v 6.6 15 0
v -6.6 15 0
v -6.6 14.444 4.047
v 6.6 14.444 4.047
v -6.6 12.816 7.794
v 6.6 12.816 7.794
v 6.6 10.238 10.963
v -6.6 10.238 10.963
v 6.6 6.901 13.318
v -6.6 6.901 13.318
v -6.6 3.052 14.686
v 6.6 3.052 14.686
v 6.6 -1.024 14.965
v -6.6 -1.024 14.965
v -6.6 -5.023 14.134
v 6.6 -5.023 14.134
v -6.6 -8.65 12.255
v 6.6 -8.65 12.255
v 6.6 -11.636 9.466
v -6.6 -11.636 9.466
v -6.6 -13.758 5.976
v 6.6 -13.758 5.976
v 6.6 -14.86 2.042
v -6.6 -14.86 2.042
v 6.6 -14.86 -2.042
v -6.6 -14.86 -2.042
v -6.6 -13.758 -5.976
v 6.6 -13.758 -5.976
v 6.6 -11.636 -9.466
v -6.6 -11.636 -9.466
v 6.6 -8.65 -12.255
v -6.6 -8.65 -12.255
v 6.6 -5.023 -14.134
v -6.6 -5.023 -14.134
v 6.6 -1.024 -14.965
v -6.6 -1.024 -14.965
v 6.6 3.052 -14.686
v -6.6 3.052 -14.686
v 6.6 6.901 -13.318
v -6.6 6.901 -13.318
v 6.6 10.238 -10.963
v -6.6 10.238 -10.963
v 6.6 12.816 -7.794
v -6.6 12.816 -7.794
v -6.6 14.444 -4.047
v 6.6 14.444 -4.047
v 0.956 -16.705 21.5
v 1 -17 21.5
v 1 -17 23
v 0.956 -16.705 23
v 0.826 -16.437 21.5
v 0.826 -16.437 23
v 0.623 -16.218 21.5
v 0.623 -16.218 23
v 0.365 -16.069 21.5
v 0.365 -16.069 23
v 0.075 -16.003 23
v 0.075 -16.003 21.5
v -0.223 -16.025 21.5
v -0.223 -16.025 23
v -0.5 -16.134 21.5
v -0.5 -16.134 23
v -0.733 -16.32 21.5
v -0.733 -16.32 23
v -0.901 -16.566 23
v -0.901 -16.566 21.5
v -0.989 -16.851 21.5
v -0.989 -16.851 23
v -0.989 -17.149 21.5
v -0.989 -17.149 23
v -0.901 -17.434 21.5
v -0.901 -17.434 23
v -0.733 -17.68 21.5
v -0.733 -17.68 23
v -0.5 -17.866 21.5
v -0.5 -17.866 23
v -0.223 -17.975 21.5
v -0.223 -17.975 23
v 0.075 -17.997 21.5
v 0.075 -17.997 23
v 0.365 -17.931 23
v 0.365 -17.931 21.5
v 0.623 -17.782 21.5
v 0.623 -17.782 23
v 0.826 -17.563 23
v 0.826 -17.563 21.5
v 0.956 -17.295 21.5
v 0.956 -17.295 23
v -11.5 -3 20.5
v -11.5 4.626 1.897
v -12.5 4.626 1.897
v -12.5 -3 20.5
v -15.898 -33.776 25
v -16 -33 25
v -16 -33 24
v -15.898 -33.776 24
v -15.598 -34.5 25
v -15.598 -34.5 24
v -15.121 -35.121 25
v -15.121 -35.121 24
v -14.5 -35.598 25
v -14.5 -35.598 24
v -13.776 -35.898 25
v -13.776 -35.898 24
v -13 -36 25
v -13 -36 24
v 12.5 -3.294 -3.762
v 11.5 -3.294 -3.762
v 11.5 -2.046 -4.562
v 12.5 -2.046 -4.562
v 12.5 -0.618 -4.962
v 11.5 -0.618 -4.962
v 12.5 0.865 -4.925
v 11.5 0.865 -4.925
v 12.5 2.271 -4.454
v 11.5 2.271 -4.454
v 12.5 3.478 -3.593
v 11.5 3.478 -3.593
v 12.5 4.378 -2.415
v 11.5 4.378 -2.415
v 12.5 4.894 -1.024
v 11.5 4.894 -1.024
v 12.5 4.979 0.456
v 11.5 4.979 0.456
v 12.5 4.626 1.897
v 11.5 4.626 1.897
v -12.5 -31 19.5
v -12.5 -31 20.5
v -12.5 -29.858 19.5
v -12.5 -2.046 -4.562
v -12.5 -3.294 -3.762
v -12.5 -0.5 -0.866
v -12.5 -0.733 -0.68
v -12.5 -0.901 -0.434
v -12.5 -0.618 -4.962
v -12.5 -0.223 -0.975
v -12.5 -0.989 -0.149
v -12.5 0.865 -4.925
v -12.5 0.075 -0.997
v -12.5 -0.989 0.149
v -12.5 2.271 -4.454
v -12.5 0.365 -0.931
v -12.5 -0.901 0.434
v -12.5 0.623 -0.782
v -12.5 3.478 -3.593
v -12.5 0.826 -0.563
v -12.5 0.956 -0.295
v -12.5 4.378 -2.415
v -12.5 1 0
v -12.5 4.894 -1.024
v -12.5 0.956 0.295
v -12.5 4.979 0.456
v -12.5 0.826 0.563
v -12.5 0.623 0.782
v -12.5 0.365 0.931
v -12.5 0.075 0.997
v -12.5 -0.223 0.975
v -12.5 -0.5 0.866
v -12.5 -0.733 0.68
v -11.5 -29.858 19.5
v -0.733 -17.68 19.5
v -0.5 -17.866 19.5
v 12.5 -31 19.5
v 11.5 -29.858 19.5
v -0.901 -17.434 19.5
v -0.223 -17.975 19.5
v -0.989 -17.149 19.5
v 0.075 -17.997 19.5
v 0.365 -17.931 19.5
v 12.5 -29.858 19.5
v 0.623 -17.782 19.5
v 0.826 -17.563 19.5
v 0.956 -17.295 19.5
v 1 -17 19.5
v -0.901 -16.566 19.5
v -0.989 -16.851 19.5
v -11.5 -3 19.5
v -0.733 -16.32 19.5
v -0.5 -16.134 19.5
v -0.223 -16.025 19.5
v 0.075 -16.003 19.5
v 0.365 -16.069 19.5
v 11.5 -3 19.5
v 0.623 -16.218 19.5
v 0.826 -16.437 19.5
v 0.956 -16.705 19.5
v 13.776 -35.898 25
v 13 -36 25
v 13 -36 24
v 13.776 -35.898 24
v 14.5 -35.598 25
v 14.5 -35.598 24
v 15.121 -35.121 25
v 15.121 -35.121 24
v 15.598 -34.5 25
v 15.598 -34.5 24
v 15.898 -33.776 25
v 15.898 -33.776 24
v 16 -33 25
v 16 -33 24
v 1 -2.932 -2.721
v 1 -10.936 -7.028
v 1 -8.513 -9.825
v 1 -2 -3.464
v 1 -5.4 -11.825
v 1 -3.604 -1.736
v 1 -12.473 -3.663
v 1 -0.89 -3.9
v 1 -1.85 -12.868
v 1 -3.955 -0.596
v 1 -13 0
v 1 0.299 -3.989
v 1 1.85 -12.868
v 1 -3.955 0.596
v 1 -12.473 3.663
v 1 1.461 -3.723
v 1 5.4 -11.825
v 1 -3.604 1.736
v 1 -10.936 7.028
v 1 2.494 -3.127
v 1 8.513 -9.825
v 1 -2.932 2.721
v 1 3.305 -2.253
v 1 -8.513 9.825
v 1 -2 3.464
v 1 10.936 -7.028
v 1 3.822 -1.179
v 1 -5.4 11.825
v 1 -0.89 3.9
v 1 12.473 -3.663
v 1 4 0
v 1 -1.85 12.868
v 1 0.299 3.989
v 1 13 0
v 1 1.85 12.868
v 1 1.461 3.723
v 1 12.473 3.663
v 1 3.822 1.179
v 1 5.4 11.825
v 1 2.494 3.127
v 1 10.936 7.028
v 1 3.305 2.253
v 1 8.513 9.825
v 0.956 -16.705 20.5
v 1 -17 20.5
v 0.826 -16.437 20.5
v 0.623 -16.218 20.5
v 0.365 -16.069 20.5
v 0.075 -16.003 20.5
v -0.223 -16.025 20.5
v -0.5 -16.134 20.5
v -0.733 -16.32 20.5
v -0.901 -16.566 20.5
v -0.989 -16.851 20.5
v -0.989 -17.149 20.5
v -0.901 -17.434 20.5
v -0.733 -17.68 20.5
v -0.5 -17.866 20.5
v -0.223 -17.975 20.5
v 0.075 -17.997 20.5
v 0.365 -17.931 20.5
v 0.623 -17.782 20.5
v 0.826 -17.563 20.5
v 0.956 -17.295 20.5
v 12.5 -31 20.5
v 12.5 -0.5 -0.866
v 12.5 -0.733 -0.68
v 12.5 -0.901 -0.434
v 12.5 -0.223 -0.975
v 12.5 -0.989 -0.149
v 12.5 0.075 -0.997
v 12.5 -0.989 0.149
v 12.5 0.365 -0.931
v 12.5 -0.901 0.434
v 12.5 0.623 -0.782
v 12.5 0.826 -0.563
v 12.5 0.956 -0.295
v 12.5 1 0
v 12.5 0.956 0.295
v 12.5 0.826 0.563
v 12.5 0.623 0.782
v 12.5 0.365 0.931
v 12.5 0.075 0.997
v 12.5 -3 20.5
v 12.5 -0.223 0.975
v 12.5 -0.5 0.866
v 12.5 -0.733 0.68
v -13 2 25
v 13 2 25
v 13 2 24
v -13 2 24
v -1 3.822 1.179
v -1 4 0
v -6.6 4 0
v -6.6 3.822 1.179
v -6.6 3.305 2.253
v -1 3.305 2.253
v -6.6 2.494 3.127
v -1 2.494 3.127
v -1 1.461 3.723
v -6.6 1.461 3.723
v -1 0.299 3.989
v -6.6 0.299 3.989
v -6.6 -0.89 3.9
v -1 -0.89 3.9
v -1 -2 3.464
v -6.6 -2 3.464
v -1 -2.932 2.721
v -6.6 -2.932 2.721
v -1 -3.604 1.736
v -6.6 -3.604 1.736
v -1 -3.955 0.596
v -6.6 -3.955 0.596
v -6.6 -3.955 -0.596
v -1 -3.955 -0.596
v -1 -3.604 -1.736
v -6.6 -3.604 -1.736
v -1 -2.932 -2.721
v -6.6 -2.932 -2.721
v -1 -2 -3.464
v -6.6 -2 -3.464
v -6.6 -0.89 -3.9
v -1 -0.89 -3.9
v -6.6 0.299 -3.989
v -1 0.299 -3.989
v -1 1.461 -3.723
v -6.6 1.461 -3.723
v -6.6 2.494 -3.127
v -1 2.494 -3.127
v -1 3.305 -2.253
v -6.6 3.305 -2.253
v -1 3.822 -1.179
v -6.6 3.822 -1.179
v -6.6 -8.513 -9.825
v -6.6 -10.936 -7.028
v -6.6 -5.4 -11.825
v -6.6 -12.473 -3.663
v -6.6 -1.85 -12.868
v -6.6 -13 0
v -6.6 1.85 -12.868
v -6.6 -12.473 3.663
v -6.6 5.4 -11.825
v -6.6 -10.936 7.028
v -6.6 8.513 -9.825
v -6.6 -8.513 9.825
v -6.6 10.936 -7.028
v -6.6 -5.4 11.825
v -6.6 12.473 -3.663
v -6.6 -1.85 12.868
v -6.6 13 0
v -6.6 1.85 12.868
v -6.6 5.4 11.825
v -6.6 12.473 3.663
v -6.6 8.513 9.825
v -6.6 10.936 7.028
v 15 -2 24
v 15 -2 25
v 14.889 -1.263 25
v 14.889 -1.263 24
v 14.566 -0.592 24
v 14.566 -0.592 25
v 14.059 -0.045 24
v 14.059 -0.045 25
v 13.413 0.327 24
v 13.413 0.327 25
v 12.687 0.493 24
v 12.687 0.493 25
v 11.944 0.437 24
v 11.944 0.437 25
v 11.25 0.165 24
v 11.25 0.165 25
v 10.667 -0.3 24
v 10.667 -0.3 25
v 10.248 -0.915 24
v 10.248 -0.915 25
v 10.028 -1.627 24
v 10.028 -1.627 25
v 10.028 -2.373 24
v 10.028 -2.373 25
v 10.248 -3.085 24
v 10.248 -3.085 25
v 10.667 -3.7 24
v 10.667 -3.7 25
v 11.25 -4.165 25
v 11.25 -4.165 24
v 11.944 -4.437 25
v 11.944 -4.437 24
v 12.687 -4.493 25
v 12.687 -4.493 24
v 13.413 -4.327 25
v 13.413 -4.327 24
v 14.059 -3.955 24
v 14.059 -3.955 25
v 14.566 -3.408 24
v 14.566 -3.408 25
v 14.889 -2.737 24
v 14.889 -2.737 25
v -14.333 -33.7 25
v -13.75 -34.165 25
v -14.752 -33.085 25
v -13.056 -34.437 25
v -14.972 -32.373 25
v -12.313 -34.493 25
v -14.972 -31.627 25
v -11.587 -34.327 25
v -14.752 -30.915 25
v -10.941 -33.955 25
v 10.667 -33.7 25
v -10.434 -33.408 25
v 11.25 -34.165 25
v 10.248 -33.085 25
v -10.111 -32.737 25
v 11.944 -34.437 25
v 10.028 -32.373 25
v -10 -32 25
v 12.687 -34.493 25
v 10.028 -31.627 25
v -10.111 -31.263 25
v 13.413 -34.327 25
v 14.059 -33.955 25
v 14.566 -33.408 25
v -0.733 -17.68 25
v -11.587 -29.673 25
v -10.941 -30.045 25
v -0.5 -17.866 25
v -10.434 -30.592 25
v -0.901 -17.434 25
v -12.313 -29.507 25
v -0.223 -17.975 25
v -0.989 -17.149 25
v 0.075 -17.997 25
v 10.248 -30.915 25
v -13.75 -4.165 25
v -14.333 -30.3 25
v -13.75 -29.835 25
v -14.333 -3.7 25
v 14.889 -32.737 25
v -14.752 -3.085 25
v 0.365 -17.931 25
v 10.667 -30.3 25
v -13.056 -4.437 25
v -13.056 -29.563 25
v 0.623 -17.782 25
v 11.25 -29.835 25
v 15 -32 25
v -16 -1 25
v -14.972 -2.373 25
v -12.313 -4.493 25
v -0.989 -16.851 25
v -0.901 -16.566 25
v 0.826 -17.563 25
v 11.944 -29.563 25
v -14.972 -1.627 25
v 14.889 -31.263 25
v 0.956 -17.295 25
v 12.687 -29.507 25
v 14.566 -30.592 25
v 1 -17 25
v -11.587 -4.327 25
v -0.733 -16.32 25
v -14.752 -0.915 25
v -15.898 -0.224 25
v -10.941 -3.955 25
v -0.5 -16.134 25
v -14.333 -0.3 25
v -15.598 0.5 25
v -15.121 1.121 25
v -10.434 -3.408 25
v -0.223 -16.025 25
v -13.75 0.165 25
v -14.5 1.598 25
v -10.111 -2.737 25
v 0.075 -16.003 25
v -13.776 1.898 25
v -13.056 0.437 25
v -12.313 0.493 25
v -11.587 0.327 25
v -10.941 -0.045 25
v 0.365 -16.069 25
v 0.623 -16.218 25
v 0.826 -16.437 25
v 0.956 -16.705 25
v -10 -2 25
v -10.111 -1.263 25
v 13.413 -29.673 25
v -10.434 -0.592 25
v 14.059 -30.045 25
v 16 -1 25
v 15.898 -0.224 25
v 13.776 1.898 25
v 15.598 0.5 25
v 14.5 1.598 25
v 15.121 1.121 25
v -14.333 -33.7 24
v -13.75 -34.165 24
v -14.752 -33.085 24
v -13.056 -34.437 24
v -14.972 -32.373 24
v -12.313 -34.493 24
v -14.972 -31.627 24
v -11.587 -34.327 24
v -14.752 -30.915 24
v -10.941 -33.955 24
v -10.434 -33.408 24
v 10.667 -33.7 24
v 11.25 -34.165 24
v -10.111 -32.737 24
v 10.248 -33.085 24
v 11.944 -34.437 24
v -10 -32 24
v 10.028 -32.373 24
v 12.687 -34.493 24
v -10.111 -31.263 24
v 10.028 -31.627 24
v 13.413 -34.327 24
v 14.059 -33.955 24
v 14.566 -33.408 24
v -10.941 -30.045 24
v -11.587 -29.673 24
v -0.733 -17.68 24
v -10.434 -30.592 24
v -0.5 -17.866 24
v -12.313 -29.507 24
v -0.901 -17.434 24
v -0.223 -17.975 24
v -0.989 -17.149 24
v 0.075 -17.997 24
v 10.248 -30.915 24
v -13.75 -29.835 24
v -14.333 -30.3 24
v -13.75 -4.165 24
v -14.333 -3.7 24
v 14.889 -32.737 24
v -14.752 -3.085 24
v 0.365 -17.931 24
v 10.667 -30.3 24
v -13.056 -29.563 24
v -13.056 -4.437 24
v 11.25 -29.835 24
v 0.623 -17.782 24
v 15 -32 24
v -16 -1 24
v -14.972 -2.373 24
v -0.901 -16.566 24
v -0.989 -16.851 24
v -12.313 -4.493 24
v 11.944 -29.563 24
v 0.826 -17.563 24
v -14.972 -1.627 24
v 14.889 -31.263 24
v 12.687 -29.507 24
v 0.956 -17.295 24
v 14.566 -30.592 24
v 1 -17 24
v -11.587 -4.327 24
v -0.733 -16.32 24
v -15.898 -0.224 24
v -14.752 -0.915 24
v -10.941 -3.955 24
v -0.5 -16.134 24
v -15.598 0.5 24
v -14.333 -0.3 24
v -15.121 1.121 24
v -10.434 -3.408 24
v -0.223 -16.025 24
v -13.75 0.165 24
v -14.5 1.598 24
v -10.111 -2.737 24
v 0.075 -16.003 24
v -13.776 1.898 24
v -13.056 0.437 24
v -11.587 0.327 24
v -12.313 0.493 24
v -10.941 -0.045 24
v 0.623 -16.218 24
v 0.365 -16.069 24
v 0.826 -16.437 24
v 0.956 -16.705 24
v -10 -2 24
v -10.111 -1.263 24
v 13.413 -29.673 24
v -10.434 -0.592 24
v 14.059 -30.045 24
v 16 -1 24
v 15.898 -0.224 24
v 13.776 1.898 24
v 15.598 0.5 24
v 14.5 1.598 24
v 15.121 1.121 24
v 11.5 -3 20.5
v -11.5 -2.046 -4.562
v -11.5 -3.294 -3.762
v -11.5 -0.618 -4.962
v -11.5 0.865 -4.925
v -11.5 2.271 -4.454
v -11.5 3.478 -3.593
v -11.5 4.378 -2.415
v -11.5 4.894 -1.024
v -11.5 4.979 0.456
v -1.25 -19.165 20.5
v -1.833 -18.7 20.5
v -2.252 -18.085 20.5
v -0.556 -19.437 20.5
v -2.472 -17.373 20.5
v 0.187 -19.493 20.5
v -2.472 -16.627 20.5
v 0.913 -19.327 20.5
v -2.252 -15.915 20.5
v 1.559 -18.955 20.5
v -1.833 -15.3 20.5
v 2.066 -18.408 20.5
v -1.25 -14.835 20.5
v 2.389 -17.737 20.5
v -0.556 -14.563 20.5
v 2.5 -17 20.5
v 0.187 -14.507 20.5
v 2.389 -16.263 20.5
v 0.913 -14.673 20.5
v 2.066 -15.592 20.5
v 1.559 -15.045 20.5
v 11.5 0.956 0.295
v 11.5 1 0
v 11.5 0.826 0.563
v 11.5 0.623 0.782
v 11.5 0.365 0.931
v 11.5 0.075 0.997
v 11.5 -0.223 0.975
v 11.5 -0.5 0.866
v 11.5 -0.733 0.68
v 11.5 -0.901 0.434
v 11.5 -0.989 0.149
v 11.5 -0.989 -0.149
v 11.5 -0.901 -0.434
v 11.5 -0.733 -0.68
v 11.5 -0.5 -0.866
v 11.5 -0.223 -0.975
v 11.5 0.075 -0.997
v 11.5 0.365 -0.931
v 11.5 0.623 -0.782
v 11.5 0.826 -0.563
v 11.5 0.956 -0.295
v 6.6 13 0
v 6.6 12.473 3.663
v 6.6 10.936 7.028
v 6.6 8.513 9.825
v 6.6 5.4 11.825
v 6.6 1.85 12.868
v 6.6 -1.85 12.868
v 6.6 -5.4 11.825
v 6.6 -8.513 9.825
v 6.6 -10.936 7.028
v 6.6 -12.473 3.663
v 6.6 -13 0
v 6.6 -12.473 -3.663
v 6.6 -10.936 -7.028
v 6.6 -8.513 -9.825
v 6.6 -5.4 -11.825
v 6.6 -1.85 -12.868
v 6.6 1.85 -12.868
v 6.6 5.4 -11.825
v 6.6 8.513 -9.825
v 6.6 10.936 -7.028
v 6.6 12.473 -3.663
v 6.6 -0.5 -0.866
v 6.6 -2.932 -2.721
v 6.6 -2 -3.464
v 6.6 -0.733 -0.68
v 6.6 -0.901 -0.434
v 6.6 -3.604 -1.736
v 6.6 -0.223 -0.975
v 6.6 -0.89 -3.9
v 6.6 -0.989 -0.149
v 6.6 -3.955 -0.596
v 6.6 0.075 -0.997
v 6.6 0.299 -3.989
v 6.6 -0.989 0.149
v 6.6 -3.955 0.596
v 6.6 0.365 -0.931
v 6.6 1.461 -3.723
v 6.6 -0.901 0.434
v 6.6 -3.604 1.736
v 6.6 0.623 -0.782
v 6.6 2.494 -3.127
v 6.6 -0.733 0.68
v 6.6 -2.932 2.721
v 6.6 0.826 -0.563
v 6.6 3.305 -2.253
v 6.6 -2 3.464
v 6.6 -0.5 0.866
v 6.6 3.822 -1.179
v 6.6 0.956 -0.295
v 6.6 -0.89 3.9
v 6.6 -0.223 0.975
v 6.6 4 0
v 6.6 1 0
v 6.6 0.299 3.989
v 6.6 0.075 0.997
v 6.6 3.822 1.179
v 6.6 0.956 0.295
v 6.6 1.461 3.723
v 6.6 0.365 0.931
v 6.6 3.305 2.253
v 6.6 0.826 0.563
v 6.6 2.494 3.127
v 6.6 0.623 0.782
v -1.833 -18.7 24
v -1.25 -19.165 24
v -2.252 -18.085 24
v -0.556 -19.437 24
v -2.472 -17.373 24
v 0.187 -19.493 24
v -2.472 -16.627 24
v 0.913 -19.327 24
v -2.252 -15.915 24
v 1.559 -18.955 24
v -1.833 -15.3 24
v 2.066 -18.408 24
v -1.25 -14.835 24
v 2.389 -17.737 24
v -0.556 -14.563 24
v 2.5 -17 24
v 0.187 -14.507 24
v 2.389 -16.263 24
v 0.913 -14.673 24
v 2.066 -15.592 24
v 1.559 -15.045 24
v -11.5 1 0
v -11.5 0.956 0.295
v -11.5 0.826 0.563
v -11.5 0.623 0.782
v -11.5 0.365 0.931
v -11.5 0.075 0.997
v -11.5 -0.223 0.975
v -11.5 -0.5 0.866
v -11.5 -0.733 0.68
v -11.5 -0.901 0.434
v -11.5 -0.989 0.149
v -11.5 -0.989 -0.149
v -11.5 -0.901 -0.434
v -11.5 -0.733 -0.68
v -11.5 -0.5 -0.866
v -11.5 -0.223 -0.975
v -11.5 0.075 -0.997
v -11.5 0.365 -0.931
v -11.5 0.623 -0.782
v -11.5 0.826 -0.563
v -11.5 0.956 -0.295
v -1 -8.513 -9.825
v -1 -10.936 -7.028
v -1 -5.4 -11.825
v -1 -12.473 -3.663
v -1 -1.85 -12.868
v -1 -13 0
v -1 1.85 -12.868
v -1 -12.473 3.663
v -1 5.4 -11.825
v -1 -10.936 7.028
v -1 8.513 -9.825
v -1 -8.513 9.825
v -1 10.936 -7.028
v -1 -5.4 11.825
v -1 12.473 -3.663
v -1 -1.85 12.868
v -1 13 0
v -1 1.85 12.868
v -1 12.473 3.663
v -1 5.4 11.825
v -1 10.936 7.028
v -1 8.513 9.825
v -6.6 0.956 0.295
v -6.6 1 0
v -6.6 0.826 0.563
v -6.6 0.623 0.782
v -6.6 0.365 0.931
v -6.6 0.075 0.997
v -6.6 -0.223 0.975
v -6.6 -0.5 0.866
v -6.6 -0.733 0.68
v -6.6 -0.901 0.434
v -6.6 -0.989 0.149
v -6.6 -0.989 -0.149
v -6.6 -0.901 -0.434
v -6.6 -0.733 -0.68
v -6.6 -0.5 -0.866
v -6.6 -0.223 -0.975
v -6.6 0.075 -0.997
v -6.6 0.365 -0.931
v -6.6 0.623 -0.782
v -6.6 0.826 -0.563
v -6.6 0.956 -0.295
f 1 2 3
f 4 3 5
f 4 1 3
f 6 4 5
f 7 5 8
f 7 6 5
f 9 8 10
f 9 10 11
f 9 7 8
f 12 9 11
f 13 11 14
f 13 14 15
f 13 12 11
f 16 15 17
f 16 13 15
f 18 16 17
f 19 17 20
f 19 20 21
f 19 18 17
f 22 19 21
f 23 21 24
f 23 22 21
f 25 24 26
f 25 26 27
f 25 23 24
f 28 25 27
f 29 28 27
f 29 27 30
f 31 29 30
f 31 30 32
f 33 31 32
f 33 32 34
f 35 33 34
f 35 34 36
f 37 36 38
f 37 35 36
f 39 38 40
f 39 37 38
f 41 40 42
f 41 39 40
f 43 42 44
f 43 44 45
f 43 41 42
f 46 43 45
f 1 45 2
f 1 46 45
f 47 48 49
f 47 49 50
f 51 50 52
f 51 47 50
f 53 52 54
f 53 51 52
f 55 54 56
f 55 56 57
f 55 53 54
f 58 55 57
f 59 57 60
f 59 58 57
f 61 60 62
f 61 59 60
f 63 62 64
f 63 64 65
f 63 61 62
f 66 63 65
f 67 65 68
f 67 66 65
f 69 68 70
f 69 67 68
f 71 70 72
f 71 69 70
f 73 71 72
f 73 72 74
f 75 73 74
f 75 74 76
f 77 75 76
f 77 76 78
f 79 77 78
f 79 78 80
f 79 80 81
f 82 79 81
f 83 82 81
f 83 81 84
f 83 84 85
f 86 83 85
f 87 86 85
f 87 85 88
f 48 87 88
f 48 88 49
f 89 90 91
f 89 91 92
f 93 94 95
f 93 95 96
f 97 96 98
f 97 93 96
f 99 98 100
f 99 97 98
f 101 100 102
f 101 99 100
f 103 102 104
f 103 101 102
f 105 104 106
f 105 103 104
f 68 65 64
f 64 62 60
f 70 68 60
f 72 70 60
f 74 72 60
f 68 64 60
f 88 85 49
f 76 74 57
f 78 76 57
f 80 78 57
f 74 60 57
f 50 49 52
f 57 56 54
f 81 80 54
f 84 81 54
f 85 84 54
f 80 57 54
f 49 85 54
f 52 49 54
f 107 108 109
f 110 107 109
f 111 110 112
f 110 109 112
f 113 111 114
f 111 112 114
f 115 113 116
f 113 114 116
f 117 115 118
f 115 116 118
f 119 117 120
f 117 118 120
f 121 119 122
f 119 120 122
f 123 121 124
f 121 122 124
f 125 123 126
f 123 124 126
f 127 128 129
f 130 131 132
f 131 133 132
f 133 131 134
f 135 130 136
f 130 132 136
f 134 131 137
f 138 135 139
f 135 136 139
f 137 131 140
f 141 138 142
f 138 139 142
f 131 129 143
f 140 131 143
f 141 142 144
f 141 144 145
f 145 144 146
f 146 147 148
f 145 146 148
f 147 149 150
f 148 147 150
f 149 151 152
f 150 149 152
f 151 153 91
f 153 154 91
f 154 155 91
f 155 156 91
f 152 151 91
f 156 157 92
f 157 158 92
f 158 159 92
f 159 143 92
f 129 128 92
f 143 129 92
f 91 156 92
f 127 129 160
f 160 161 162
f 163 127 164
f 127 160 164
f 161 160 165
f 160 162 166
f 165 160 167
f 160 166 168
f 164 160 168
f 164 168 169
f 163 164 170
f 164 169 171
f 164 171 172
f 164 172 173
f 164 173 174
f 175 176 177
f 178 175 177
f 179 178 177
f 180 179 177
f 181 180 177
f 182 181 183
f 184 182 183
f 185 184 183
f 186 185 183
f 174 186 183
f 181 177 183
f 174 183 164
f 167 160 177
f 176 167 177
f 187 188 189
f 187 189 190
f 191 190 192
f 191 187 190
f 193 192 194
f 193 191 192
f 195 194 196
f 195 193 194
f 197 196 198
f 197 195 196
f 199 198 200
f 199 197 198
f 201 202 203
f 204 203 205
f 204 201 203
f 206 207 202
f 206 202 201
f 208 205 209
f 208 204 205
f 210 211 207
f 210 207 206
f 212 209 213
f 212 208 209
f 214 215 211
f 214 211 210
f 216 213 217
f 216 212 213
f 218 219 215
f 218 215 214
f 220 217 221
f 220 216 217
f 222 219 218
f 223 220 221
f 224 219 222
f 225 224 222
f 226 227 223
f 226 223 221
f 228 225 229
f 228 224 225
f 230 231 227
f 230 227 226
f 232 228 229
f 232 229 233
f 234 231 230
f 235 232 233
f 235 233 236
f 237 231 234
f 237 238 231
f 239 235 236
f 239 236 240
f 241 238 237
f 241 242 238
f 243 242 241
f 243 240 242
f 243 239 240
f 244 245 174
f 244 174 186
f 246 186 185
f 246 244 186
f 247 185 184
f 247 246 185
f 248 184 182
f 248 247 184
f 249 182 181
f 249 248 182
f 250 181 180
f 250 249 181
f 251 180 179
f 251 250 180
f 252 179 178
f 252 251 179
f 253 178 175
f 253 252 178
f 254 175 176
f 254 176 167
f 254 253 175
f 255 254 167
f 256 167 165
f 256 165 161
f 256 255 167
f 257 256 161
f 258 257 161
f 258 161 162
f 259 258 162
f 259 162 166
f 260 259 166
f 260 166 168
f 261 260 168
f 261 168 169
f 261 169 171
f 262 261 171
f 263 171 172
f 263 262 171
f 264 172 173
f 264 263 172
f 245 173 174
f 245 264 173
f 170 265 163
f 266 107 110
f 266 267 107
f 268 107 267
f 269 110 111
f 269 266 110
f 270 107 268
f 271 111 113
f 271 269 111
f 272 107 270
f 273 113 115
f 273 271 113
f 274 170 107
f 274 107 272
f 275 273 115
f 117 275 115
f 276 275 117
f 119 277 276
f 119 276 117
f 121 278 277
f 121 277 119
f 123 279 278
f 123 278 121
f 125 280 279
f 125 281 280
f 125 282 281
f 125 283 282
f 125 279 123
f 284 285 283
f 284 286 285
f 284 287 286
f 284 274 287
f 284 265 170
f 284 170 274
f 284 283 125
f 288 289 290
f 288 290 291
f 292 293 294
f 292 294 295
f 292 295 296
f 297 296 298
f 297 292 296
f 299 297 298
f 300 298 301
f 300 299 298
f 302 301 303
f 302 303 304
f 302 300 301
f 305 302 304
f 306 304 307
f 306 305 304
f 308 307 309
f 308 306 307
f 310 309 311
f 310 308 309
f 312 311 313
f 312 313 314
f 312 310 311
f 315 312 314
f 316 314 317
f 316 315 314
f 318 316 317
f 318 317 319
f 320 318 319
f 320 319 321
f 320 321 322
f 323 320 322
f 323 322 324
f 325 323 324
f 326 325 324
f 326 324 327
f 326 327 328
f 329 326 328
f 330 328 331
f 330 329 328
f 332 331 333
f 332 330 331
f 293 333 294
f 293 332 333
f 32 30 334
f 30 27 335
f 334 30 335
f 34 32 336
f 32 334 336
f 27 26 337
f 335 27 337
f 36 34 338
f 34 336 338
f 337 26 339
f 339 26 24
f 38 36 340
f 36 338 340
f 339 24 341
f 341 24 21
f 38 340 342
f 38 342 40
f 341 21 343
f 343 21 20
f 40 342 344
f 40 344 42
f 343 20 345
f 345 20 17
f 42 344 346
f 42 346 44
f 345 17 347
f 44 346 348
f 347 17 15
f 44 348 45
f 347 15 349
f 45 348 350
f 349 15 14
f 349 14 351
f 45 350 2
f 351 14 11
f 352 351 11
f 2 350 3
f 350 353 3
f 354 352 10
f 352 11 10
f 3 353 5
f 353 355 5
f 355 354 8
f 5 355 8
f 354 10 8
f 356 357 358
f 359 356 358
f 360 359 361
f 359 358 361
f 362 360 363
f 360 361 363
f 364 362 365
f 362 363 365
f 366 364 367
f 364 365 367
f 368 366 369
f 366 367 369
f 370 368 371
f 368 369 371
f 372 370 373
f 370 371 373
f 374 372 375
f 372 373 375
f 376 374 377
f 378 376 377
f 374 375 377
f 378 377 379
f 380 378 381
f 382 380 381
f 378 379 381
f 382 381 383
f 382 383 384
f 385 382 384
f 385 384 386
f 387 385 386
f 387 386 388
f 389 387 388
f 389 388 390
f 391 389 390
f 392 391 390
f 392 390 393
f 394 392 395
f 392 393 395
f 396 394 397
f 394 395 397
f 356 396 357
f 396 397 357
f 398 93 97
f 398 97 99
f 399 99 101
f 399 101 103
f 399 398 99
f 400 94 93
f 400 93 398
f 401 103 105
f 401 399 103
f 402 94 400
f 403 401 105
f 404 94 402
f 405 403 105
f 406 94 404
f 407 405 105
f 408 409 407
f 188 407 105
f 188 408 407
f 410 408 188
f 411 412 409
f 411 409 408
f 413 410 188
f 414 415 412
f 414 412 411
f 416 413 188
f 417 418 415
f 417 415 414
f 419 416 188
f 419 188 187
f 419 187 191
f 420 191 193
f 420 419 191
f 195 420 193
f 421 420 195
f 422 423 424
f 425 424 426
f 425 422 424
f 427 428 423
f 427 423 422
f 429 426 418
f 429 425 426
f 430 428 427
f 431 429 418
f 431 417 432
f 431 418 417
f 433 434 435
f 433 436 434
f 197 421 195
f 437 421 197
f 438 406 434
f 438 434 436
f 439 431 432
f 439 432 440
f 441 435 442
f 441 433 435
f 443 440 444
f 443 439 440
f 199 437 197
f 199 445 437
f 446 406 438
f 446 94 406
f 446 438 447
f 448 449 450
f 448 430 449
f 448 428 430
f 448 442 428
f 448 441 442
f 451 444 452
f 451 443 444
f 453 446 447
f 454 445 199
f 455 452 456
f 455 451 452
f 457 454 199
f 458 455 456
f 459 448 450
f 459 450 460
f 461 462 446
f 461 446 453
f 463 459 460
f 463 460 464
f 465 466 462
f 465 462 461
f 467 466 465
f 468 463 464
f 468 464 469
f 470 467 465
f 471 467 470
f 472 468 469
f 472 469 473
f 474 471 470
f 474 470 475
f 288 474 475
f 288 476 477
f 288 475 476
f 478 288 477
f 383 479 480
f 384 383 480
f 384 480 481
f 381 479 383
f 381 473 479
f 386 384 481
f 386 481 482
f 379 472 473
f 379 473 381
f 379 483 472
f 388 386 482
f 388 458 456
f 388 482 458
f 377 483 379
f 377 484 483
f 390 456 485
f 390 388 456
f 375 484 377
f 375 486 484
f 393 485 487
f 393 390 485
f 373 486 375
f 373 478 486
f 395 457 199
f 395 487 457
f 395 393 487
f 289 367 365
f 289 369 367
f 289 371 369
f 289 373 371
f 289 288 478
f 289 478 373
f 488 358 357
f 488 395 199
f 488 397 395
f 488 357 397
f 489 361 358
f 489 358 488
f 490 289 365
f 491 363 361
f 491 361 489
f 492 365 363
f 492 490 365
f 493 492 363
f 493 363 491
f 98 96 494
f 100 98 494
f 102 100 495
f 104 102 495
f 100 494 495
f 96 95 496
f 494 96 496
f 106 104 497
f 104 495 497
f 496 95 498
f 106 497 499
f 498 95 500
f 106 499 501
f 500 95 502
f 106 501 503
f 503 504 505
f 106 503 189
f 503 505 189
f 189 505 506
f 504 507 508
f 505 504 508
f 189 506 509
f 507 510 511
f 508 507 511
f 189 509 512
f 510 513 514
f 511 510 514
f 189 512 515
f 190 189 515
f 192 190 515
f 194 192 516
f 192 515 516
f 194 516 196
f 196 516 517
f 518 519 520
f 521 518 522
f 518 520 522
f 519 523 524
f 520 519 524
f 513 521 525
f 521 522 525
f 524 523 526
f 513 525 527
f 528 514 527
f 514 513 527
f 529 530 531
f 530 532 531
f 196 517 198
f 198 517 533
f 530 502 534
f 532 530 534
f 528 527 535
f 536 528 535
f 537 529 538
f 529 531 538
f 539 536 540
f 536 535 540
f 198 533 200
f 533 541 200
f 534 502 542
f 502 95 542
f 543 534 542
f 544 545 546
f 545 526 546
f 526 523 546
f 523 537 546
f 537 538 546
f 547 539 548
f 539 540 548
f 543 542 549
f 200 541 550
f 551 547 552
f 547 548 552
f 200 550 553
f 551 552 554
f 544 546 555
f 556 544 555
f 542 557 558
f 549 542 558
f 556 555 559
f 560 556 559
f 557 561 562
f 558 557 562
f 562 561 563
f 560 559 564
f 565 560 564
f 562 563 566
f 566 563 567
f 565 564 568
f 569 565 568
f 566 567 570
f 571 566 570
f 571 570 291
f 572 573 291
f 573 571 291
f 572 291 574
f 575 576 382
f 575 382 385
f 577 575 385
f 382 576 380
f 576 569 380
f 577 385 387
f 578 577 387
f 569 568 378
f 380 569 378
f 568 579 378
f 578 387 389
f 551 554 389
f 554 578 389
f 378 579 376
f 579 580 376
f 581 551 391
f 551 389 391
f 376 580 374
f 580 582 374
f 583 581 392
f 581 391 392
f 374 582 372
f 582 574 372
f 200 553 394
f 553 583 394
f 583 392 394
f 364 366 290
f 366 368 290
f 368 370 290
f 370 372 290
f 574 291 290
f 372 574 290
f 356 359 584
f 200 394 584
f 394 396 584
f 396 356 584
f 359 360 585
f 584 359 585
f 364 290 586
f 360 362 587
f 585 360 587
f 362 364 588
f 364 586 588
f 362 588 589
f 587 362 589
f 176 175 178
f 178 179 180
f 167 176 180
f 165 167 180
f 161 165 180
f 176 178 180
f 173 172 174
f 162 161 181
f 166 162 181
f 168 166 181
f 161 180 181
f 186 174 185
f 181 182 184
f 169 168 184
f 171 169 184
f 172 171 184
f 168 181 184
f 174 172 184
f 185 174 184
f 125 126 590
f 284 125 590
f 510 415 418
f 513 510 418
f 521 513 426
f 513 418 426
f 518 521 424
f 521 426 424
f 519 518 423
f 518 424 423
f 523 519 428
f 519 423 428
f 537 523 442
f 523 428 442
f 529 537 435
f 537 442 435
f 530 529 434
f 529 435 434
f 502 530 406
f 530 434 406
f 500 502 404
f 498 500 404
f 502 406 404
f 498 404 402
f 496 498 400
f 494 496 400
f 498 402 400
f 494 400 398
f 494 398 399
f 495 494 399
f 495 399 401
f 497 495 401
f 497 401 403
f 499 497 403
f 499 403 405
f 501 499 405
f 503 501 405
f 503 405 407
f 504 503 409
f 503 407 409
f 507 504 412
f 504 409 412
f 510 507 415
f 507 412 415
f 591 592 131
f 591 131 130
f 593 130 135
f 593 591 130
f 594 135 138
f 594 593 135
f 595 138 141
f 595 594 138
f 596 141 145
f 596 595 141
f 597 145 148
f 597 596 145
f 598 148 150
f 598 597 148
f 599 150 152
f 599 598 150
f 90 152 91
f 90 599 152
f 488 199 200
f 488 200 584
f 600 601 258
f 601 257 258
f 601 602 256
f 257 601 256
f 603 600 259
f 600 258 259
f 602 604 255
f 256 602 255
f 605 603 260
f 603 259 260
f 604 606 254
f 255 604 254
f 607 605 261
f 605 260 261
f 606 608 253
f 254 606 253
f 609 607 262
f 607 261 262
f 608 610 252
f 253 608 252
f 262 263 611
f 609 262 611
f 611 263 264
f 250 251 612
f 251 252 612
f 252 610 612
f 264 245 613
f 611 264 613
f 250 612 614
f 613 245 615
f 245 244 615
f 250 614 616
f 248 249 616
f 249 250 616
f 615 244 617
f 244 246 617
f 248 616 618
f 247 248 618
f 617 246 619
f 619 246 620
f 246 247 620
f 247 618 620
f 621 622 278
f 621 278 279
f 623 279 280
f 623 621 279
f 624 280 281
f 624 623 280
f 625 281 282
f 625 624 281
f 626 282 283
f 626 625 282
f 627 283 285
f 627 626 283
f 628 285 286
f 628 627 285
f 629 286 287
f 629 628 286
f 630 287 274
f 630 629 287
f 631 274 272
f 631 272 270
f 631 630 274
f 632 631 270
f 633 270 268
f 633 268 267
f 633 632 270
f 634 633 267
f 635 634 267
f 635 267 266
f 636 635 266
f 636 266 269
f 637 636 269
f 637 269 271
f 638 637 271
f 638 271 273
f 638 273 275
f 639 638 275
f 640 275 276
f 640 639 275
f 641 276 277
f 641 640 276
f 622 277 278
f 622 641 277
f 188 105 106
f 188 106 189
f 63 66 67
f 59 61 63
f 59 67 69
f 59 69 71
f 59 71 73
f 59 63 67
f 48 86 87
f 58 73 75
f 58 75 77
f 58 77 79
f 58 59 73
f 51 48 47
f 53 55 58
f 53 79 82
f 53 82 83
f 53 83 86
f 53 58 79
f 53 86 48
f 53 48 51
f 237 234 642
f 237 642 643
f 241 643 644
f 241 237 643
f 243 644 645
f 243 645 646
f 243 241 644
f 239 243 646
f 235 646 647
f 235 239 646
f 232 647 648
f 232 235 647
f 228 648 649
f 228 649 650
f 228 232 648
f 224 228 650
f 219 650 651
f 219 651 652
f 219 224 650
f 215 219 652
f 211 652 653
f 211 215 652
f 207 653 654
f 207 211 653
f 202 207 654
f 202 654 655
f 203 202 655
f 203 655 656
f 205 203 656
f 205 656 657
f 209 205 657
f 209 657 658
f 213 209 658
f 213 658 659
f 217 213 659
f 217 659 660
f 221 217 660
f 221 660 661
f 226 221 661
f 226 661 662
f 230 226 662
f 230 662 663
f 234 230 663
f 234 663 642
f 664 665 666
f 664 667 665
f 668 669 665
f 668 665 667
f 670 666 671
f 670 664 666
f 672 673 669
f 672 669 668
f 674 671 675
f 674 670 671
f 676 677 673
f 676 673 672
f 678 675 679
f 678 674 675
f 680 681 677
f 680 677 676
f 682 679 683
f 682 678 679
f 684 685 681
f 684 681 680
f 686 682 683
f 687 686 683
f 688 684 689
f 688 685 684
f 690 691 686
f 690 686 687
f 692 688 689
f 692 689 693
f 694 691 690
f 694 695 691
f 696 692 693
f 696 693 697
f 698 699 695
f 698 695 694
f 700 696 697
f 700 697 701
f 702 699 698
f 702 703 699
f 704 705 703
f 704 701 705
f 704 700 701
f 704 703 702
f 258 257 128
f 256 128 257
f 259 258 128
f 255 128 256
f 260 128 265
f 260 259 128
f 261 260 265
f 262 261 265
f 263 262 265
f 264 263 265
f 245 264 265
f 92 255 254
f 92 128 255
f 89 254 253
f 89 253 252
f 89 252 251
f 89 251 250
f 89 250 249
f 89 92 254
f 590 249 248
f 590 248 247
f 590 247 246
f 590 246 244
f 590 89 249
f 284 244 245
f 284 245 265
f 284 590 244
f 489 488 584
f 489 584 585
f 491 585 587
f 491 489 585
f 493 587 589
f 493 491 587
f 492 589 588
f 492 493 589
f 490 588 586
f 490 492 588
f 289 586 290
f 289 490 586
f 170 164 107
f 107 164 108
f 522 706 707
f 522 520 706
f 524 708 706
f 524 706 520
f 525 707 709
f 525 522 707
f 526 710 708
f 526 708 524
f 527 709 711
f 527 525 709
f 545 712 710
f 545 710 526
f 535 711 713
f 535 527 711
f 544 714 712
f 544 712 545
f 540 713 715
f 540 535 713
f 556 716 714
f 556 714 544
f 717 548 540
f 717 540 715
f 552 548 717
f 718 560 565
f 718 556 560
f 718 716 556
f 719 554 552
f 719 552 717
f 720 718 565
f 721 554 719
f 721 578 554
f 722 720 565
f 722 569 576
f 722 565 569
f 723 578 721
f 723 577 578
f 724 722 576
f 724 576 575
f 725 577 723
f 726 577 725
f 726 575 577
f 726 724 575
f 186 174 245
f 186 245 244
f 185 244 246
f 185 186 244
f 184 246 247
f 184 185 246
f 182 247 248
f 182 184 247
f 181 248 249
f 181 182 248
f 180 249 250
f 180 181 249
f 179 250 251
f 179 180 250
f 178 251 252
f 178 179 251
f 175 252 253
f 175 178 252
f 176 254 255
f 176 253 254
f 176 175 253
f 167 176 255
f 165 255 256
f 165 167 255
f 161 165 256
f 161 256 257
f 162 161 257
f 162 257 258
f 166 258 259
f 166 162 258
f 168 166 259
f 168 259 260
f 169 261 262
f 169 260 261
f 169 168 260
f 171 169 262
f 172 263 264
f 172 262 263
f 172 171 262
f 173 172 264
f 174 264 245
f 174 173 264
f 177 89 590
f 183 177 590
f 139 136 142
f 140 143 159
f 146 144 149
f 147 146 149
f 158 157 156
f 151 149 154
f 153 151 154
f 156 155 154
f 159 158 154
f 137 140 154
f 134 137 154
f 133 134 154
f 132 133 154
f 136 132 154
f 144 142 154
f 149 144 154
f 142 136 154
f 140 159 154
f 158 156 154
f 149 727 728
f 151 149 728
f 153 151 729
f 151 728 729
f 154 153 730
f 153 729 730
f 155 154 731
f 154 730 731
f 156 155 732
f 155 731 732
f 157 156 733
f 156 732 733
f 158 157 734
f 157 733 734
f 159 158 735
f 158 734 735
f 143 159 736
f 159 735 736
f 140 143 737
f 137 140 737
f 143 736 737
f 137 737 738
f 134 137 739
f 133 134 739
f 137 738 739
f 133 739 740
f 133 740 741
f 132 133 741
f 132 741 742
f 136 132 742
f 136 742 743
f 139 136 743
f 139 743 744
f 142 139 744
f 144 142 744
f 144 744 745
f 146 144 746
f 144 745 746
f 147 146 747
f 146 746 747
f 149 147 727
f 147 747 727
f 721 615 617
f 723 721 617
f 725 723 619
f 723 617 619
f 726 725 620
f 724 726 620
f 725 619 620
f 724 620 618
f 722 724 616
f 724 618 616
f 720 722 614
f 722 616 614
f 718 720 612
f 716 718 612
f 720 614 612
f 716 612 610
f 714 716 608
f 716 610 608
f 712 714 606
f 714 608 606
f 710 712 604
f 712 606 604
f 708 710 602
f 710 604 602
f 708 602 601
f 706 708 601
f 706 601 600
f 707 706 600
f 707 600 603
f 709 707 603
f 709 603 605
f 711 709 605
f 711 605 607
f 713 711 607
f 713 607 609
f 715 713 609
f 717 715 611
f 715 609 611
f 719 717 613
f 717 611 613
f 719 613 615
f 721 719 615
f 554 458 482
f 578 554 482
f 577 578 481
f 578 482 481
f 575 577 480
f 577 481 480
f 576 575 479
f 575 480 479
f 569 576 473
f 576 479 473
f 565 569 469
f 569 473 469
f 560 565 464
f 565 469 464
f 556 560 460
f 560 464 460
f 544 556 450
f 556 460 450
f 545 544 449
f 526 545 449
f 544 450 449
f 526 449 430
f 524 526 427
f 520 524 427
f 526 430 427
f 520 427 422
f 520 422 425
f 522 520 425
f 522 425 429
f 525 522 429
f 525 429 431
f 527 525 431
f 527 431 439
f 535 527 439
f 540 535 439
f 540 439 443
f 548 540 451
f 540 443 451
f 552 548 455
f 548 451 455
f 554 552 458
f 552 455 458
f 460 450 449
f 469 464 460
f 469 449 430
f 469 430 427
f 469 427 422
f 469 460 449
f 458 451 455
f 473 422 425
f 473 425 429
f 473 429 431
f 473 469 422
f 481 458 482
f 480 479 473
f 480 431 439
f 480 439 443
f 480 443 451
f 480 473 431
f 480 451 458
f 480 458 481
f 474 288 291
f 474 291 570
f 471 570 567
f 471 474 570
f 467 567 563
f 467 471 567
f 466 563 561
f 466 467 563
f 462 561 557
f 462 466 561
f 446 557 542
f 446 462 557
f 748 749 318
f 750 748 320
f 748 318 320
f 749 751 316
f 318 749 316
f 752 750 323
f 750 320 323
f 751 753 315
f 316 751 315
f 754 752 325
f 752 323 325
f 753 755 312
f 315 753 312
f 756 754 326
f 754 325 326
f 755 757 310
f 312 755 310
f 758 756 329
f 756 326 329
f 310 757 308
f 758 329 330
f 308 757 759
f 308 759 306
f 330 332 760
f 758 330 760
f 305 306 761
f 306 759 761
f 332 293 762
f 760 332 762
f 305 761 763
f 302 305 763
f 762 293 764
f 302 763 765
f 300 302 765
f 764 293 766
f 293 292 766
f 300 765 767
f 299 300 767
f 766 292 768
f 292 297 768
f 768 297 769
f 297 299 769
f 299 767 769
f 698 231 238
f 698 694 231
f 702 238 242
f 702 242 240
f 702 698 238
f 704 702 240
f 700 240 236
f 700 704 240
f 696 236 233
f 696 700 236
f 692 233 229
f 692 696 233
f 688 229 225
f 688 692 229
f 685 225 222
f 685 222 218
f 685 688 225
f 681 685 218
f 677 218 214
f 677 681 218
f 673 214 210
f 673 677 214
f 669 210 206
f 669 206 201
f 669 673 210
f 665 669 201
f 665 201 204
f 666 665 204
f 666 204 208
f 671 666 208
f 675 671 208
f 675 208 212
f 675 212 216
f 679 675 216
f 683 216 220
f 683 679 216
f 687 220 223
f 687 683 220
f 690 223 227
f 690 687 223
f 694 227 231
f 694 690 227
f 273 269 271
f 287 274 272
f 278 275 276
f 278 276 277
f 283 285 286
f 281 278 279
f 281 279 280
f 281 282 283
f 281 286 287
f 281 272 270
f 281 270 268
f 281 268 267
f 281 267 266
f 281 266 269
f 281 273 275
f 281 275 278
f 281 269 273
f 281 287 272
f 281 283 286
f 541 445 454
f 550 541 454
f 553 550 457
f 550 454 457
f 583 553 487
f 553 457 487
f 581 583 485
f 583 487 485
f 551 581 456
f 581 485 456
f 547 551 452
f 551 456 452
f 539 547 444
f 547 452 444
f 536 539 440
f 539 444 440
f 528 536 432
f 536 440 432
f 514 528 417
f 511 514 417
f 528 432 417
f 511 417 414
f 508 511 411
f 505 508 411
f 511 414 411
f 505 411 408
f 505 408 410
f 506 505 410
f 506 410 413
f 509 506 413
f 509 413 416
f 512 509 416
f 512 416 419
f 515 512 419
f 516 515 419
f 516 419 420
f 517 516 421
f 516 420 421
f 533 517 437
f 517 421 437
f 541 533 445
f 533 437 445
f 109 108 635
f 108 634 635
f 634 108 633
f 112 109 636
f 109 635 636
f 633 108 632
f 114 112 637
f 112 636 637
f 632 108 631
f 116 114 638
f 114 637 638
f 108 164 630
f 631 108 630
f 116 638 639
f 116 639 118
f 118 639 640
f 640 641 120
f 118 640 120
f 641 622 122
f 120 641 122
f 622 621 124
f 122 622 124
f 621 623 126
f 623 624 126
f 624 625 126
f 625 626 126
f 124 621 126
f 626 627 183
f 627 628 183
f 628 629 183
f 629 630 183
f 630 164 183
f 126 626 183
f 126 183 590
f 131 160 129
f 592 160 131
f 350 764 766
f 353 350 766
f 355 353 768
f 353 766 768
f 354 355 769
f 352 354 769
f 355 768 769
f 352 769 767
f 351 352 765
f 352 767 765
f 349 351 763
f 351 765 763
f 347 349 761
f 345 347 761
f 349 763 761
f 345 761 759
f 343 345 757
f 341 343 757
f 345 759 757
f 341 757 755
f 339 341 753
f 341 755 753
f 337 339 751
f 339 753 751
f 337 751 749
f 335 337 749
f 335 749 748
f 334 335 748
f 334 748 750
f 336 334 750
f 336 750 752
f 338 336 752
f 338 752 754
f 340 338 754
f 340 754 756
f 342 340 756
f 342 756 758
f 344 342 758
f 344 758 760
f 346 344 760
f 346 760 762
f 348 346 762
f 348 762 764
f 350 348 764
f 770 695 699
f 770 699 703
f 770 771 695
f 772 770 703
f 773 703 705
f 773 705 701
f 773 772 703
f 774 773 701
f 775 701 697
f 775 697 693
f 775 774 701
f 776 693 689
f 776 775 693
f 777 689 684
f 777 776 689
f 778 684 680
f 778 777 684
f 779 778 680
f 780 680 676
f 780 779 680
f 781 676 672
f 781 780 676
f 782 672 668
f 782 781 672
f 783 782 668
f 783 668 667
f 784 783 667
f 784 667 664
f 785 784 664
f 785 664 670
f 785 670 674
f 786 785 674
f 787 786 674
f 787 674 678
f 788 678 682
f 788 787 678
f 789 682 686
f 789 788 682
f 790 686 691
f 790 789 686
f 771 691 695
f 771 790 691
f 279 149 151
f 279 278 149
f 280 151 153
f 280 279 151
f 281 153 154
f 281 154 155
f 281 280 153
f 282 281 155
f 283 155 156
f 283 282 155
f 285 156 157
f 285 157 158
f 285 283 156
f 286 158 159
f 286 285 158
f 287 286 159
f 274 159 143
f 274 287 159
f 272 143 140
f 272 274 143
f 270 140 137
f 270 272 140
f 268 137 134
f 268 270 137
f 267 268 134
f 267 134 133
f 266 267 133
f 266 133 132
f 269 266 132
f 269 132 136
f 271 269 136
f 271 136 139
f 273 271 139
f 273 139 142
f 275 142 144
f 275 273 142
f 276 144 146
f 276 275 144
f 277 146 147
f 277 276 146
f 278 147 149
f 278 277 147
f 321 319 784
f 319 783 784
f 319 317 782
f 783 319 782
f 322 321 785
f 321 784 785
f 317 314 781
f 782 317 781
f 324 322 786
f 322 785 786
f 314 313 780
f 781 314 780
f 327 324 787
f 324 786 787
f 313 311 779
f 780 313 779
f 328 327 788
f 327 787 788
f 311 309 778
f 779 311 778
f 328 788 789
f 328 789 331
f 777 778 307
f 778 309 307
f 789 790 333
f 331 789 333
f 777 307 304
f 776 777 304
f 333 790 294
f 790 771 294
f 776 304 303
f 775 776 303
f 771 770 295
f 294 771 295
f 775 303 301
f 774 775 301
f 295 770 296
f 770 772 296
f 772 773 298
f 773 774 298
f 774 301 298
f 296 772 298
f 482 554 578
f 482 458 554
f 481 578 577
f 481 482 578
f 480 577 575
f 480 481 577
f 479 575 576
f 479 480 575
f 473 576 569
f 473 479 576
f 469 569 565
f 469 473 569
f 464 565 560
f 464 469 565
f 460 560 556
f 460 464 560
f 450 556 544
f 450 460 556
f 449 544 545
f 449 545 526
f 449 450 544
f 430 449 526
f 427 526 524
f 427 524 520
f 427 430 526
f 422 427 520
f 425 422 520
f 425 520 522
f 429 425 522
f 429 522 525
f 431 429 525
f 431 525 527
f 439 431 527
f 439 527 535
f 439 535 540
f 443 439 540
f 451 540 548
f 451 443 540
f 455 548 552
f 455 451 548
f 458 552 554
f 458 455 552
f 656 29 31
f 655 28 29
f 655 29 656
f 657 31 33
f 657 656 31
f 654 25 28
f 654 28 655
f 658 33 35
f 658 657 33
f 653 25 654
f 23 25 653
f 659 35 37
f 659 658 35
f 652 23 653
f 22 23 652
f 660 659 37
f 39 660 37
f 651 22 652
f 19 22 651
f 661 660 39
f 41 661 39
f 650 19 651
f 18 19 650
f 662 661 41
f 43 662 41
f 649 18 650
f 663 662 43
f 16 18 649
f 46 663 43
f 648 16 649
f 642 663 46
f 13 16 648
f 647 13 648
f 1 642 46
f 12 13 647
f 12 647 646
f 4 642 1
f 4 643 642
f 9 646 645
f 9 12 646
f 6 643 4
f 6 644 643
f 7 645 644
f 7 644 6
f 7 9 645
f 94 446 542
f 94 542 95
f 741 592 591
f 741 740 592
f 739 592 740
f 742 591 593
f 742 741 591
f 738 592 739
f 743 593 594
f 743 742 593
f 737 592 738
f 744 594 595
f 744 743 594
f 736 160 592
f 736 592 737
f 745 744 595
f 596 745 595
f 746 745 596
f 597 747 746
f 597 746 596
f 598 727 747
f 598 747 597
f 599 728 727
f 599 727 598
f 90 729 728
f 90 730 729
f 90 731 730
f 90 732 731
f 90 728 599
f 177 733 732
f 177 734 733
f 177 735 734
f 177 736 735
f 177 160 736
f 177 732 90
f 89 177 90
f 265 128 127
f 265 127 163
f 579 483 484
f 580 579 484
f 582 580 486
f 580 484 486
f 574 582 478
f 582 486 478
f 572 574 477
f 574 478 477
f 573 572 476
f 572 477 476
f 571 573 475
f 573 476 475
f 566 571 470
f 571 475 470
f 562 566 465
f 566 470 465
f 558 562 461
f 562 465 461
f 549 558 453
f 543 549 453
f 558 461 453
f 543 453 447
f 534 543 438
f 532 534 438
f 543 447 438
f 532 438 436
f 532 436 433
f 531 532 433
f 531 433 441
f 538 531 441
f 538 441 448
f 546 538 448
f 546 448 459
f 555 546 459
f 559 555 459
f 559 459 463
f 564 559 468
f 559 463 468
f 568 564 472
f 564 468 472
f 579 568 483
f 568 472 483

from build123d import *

# Parameters (mm, degrees)
F0_R      = 13
F0_R_2    = 4
F1_DEPTH  = 1
F0_R_3    = 15
F0_R_4    = 1
F2_DEPTH  = 6.6
F4_W      = 25
F4_H      = 28
F4_R      = 1
F5_DEPTH  = 0.5
F7_R      = 1
F8_DEPTH  = 1
F11_R     = 2.5
F11_R_2   = 1
F12_DEPTH = 1
F13_R     = 1
F14_DEPTH = 1
F13_R_2   = 2.5
F15_DEPTH = 3.5
F16_R     = 1
F17_DEPTH = 1
F18_R     = 1
F19_DEPTH = 12.5


with BuildPart() as f1:
    # F0 (on Right) → F1 (new body, symmetric)
    with BuildSketch(Plane.YZ):
        Circle(F0_R)
        Circle(F0_R_2, mode=Mode.SUBTRACT)
    extrude(amount=F1_DEPTH, both=True)

    # F0 (on Right) → F2 (join, symmetric)
    with BuildSketch(Plane.YZ):
        Circle(F0_R_3)
        Circle(F0_R, mode=Mode.SUBTRACT)
        Circle(F0_R_2)
        Circle(F0_R_4, mode=Mode.SUBTRACT)
    extrude(amount=F2_DEPTH, both=True)


with BuildPart() as f5:
    # F4 (on offset) → F5 (new body, symmetric)
    with BuildSketch(Plane.XY.offset(20)):
        with Locations((0, -17)):
            Rectangle(F4_W, F4_H)
        with Locations((0, -17)):
            Circle(F4_R, mode=Mode.SUBTRACT)
    extrude(amount=F5_DEPTH, both=True)

    # F7 (on offset) → F8 (join)
    with BuildSketch(Plane.YZ.offset(11.5)):
        with BuildLine():
            Line((-3, 20.5), (-31, 20.5))
            Line((-31, 20.5), (-3.2939715582, -3.7616155271))
            ThreePointArc((-3.2939715582, -3.7616155271), (2.9064564522, -4.0684777118), (4.6263525904, 1.8965394035))
            Line((4.6263525904, 1.8965394035), (-3, 20.5))
        make_face()
        Circle(F7_R, mode=Mode.SUBTRACT)
    extrude(amount=F8_DEPTH)

    # F9: F5 across plane


with BuildPart() as f5_1:
    add(f5.part)
    add(f5.part.mirror(Plane.YZ))


with BuildPart() as f12:
    # F11 (on offset) → F12 (new body)
    with BuildSketch(Plane.XY.offset(25)):
        with BuildLine():
            ThreePointArc((-16, -33), (-15.1213203436, -35.1213203436), (-13, -36))
            Line((-13, -36), (13, -36))
            ThreePointArc((13, -36), (15.1213203436, -35.1213203436), (16, -33))
            Line((16, -33), (16, -1))
            ThreePointArc((16, -1), (15.1213203436, 1.1213203436), (13, 2))
            Line((13, 2), (-13, 2))
            ThreePointArc((-13, 2), (-15.1213203436, 1.1213203436), (-16, -1))
            Line((-16, -1), (-16, -33))
        make_face()
        with Locations((-12.5, -32)):
            Circle(F11_R, mode=Mode.SUBTRACT)
        with Locations((12.5, -32)):
            Circle(F11_R, mode=Mode.SUBTRACT)
        with Locations((-12.5, -2)):
            Circle(F11_R, mode=Mode.SUBTRACT)
        with Locations((0, -17)):
            Circle(F11_R_2, mode=Mode.SUBTRACT)
        with Locations((12.5, -2)):
            Circle(F11_R, mode=Mode.SUBTRACT)
    extrude(amount=-F12_DEPTH)


with BuildPart() as f14:
    # F13 (on face) → F14 (new body, symmetric)
    with BuildSketch(Plane.XY.offset(20.5)):
        with Locations((0, -17)):
            Circle(F13_R)
    extrude(amount=F14_DEPTH, both=True)

    # F13 (on face) → F15 (join)
    with BuildSketch(Plane.XY.offset(20.5)):
        with Locations((0, -17)):
            Circle(F13_R_2)
        with Locations((0, -17)):
            Circle(F13_R, mode=Mode.SUBTRACT)
    extrude(amount=F15_DEPTH)

    # F16 (on face) → F17 (join, symmetric)
    with BuildSketch(Plane.XY.offset(24)):
        with Locations((0, -17)):
            Circle(F16_R)
    extrude(amount=F17_DEPTH, both=True)


with BuildPart() as f19:
    # F18 (on Right) → F19 (new body, symmetric)
    with BuildSketch(Plane.YZ):
        Circle(F18_R)
    extrude(amount=F19_DEPTH, both=True)


solid = Compound([f1.part, f5_1.part, f12.part, f14.part, f19.part])
